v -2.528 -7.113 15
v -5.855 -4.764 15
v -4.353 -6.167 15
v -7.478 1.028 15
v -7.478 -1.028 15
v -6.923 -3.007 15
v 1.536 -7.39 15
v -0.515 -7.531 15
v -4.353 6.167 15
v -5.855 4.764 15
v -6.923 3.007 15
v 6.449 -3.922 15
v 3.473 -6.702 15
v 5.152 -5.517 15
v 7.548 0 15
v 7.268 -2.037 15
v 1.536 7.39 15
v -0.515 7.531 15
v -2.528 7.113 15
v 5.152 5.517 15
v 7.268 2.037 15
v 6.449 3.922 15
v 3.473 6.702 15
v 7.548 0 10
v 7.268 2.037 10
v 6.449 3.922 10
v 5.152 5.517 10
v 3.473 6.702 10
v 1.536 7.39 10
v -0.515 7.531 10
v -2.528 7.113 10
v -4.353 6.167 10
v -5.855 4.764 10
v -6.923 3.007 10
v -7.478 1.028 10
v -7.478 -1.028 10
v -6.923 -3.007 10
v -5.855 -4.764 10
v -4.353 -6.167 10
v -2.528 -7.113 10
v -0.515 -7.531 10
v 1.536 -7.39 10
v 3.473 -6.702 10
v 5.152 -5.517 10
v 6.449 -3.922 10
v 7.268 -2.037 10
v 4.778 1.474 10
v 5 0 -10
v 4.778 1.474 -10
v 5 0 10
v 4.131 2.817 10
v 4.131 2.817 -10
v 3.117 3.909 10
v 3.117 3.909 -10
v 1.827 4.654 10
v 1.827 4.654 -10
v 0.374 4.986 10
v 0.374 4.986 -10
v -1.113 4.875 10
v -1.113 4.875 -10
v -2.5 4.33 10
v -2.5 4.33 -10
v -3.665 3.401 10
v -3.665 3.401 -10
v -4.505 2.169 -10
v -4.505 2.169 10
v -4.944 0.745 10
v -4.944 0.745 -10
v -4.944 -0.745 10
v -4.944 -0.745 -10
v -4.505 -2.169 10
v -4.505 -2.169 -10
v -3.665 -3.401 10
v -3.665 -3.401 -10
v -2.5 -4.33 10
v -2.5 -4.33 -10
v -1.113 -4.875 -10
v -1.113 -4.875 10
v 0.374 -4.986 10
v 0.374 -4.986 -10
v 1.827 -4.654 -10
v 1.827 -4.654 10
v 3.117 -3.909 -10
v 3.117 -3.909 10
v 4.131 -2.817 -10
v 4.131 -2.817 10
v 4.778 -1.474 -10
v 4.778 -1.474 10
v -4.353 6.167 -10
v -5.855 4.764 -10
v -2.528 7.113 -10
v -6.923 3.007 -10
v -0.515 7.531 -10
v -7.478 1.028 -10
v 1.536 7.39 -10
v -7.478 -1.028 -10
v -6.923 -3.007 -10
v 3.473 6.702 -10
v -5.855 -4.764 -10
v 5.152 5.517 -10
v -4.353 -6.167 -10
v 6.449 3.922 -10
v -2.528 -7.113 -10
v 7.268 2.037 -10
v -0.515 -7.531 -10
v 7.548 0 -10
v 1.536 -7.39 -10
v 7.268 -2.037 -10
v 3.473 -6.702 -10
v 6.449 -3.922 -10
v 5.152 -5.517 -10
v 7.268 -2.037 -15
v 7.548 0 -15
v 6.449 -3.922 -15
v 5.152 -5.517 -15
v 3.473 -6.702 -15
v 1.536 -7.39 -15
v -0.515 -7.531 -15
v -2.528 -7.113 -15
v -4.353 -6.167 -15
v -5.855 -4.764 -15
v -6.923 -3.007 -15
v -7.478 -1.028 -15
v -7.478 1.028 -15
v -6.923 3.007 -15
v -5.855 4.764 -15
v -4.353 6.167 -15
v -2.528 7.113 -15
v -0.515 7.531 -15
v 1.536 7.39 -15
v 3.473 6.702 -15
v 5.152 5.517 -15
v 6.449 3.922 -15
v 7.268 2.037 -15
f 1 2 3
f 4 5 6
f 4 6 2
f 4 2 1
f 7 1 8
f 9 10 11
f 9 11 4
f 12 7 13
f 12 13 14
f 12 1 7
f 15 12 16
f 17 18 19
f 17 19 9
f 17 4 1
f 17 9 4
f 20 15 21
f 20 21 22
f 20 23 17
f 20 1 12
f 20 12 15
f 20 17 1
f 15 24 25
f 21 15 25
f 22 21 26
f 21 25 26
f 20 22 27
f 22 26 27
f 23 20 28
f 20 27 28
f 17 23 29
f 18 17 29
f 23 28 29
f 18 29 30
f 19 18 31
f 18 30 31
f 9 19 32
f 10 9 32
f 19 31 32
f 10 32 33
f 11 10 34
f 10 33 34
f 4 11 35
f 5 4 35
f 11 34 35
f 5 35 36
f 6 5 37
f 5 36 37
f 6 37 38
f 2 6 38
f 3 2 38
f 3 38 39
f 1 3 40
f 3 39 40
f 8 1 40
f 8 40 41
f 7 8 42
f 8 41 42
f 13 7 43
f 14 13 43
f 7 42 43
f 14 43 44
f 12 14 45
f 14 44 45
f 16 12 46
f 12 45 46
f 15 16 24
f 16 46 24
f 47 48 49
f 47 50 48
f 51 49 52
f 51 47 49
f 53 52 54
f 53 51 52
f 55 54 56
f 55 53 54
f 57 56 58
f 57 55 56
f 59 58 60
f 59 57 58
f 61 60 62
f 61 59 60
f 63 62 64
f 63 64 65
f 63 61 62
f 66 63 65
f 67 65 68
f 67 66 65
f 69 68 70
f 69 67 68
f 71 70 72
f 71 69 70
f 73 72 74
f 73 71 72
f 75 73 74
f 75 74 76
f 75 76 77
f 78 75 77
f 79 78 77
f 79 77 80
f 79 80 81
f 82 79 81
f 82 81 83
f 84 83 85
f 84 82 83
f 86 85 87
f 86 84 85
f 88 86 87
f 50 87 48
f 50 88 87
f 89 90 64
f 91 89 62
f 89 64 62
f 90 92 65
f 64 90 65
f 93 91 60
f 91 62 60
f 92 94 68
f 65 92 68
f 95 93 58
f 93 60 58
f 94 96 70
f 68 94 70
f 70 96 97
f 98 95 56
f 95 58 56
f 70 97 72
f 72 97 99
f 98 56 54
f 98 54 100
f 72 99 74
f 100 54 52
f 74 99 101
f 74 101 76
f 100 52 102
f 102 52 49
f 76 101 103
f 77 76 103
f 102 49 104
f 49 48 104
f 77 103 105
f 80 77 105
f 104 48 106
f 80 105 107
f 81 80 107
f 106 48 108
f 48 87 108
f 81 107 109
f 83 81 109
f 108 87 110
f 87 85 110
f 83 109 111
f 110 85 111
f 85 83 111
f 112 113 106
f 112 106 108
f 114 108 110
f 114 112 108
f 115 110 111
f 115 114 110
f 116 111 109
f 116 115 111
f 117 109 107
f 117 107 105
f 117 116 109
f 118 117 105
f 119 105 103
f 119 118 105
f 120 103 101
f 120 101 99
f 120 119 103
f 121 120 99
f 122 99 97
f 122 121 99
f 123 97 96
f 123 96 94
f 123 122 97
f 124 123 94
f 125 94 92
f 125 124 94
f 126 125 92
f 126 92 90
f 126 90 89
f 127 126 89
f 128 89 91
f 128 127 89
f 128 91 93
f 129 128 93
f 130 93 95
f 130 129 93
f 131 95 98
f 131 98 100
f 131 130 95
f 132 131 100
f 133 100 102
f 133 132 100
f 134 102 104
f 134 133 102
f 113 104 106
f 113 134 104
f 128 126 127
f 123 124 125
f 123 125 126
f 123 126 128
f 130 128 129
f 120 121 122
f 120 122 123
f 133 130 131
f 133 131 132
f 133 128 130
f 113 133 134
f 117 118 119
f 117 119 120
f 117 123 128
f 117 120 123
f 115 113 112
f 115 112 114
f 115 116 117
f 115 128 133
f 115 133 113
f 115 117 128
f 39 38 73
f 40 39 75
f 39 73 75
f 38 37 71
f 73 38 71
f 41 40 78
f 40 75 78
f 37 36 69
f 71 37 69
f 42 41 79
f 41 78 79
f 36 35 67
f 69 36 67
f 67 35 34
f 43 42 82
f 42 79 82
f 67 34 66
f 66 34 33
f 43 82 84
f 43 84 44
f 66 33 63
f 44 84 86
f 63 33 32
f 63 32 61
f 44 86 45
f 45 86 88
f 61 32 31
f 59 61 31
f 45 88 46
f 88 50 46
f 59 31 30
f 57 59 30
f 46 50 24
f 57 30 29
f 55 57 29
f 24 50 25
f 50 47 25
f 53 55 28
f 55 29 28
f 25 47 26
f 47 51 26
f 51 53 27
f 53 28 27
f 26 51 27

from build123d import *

# Parameters (mm, degrees)
SKETCH2_R           = 5
BOSS_EXTRUDE1_DEPTH = 10
SKETCH3_R           = 7.548336158
BOSS_EXTRUDE2_DEPTH = 5
BOSS_EXTRUDE3_START = 5
SKETCH4_R           = 7.548336158
BOSS_EXTRUDE3_DEPTH = 5


with BuildPart() as part:
    # Sketch2 → Boss-Extrude1 (new, symmetric)
    with BuildSketch(Plane.XY):
        Circle(SKETCH2_R)
    extrude(amount=BOSS_EXTRUDE1_DEPTH, both=True)

    # Sketch3 → Boss-Extrude2 (add)
    with BuildSketch(Plane.XY.offset(10)):
        Circle(SKETCH3_R)
    extrude(amount=BOSS_EXTRUDE2_DEPTH)

    # Sketch4 → Boss-Extrude3 (add)
    with BuildSketch(Plane(origin=(0, 0, -10), x_dir=(-1, 0, 0), z_dir=(0, 0, -1)).offset(BOSS_EXTRUDE3_START)):
        with Locations(Location((0, 0, 0), (0, 0, 180))):
            Circle(SKETCH4_R)
    extrude(amount=-BOSS_EXTRUDE3_DEPTH)


solid = part.part
